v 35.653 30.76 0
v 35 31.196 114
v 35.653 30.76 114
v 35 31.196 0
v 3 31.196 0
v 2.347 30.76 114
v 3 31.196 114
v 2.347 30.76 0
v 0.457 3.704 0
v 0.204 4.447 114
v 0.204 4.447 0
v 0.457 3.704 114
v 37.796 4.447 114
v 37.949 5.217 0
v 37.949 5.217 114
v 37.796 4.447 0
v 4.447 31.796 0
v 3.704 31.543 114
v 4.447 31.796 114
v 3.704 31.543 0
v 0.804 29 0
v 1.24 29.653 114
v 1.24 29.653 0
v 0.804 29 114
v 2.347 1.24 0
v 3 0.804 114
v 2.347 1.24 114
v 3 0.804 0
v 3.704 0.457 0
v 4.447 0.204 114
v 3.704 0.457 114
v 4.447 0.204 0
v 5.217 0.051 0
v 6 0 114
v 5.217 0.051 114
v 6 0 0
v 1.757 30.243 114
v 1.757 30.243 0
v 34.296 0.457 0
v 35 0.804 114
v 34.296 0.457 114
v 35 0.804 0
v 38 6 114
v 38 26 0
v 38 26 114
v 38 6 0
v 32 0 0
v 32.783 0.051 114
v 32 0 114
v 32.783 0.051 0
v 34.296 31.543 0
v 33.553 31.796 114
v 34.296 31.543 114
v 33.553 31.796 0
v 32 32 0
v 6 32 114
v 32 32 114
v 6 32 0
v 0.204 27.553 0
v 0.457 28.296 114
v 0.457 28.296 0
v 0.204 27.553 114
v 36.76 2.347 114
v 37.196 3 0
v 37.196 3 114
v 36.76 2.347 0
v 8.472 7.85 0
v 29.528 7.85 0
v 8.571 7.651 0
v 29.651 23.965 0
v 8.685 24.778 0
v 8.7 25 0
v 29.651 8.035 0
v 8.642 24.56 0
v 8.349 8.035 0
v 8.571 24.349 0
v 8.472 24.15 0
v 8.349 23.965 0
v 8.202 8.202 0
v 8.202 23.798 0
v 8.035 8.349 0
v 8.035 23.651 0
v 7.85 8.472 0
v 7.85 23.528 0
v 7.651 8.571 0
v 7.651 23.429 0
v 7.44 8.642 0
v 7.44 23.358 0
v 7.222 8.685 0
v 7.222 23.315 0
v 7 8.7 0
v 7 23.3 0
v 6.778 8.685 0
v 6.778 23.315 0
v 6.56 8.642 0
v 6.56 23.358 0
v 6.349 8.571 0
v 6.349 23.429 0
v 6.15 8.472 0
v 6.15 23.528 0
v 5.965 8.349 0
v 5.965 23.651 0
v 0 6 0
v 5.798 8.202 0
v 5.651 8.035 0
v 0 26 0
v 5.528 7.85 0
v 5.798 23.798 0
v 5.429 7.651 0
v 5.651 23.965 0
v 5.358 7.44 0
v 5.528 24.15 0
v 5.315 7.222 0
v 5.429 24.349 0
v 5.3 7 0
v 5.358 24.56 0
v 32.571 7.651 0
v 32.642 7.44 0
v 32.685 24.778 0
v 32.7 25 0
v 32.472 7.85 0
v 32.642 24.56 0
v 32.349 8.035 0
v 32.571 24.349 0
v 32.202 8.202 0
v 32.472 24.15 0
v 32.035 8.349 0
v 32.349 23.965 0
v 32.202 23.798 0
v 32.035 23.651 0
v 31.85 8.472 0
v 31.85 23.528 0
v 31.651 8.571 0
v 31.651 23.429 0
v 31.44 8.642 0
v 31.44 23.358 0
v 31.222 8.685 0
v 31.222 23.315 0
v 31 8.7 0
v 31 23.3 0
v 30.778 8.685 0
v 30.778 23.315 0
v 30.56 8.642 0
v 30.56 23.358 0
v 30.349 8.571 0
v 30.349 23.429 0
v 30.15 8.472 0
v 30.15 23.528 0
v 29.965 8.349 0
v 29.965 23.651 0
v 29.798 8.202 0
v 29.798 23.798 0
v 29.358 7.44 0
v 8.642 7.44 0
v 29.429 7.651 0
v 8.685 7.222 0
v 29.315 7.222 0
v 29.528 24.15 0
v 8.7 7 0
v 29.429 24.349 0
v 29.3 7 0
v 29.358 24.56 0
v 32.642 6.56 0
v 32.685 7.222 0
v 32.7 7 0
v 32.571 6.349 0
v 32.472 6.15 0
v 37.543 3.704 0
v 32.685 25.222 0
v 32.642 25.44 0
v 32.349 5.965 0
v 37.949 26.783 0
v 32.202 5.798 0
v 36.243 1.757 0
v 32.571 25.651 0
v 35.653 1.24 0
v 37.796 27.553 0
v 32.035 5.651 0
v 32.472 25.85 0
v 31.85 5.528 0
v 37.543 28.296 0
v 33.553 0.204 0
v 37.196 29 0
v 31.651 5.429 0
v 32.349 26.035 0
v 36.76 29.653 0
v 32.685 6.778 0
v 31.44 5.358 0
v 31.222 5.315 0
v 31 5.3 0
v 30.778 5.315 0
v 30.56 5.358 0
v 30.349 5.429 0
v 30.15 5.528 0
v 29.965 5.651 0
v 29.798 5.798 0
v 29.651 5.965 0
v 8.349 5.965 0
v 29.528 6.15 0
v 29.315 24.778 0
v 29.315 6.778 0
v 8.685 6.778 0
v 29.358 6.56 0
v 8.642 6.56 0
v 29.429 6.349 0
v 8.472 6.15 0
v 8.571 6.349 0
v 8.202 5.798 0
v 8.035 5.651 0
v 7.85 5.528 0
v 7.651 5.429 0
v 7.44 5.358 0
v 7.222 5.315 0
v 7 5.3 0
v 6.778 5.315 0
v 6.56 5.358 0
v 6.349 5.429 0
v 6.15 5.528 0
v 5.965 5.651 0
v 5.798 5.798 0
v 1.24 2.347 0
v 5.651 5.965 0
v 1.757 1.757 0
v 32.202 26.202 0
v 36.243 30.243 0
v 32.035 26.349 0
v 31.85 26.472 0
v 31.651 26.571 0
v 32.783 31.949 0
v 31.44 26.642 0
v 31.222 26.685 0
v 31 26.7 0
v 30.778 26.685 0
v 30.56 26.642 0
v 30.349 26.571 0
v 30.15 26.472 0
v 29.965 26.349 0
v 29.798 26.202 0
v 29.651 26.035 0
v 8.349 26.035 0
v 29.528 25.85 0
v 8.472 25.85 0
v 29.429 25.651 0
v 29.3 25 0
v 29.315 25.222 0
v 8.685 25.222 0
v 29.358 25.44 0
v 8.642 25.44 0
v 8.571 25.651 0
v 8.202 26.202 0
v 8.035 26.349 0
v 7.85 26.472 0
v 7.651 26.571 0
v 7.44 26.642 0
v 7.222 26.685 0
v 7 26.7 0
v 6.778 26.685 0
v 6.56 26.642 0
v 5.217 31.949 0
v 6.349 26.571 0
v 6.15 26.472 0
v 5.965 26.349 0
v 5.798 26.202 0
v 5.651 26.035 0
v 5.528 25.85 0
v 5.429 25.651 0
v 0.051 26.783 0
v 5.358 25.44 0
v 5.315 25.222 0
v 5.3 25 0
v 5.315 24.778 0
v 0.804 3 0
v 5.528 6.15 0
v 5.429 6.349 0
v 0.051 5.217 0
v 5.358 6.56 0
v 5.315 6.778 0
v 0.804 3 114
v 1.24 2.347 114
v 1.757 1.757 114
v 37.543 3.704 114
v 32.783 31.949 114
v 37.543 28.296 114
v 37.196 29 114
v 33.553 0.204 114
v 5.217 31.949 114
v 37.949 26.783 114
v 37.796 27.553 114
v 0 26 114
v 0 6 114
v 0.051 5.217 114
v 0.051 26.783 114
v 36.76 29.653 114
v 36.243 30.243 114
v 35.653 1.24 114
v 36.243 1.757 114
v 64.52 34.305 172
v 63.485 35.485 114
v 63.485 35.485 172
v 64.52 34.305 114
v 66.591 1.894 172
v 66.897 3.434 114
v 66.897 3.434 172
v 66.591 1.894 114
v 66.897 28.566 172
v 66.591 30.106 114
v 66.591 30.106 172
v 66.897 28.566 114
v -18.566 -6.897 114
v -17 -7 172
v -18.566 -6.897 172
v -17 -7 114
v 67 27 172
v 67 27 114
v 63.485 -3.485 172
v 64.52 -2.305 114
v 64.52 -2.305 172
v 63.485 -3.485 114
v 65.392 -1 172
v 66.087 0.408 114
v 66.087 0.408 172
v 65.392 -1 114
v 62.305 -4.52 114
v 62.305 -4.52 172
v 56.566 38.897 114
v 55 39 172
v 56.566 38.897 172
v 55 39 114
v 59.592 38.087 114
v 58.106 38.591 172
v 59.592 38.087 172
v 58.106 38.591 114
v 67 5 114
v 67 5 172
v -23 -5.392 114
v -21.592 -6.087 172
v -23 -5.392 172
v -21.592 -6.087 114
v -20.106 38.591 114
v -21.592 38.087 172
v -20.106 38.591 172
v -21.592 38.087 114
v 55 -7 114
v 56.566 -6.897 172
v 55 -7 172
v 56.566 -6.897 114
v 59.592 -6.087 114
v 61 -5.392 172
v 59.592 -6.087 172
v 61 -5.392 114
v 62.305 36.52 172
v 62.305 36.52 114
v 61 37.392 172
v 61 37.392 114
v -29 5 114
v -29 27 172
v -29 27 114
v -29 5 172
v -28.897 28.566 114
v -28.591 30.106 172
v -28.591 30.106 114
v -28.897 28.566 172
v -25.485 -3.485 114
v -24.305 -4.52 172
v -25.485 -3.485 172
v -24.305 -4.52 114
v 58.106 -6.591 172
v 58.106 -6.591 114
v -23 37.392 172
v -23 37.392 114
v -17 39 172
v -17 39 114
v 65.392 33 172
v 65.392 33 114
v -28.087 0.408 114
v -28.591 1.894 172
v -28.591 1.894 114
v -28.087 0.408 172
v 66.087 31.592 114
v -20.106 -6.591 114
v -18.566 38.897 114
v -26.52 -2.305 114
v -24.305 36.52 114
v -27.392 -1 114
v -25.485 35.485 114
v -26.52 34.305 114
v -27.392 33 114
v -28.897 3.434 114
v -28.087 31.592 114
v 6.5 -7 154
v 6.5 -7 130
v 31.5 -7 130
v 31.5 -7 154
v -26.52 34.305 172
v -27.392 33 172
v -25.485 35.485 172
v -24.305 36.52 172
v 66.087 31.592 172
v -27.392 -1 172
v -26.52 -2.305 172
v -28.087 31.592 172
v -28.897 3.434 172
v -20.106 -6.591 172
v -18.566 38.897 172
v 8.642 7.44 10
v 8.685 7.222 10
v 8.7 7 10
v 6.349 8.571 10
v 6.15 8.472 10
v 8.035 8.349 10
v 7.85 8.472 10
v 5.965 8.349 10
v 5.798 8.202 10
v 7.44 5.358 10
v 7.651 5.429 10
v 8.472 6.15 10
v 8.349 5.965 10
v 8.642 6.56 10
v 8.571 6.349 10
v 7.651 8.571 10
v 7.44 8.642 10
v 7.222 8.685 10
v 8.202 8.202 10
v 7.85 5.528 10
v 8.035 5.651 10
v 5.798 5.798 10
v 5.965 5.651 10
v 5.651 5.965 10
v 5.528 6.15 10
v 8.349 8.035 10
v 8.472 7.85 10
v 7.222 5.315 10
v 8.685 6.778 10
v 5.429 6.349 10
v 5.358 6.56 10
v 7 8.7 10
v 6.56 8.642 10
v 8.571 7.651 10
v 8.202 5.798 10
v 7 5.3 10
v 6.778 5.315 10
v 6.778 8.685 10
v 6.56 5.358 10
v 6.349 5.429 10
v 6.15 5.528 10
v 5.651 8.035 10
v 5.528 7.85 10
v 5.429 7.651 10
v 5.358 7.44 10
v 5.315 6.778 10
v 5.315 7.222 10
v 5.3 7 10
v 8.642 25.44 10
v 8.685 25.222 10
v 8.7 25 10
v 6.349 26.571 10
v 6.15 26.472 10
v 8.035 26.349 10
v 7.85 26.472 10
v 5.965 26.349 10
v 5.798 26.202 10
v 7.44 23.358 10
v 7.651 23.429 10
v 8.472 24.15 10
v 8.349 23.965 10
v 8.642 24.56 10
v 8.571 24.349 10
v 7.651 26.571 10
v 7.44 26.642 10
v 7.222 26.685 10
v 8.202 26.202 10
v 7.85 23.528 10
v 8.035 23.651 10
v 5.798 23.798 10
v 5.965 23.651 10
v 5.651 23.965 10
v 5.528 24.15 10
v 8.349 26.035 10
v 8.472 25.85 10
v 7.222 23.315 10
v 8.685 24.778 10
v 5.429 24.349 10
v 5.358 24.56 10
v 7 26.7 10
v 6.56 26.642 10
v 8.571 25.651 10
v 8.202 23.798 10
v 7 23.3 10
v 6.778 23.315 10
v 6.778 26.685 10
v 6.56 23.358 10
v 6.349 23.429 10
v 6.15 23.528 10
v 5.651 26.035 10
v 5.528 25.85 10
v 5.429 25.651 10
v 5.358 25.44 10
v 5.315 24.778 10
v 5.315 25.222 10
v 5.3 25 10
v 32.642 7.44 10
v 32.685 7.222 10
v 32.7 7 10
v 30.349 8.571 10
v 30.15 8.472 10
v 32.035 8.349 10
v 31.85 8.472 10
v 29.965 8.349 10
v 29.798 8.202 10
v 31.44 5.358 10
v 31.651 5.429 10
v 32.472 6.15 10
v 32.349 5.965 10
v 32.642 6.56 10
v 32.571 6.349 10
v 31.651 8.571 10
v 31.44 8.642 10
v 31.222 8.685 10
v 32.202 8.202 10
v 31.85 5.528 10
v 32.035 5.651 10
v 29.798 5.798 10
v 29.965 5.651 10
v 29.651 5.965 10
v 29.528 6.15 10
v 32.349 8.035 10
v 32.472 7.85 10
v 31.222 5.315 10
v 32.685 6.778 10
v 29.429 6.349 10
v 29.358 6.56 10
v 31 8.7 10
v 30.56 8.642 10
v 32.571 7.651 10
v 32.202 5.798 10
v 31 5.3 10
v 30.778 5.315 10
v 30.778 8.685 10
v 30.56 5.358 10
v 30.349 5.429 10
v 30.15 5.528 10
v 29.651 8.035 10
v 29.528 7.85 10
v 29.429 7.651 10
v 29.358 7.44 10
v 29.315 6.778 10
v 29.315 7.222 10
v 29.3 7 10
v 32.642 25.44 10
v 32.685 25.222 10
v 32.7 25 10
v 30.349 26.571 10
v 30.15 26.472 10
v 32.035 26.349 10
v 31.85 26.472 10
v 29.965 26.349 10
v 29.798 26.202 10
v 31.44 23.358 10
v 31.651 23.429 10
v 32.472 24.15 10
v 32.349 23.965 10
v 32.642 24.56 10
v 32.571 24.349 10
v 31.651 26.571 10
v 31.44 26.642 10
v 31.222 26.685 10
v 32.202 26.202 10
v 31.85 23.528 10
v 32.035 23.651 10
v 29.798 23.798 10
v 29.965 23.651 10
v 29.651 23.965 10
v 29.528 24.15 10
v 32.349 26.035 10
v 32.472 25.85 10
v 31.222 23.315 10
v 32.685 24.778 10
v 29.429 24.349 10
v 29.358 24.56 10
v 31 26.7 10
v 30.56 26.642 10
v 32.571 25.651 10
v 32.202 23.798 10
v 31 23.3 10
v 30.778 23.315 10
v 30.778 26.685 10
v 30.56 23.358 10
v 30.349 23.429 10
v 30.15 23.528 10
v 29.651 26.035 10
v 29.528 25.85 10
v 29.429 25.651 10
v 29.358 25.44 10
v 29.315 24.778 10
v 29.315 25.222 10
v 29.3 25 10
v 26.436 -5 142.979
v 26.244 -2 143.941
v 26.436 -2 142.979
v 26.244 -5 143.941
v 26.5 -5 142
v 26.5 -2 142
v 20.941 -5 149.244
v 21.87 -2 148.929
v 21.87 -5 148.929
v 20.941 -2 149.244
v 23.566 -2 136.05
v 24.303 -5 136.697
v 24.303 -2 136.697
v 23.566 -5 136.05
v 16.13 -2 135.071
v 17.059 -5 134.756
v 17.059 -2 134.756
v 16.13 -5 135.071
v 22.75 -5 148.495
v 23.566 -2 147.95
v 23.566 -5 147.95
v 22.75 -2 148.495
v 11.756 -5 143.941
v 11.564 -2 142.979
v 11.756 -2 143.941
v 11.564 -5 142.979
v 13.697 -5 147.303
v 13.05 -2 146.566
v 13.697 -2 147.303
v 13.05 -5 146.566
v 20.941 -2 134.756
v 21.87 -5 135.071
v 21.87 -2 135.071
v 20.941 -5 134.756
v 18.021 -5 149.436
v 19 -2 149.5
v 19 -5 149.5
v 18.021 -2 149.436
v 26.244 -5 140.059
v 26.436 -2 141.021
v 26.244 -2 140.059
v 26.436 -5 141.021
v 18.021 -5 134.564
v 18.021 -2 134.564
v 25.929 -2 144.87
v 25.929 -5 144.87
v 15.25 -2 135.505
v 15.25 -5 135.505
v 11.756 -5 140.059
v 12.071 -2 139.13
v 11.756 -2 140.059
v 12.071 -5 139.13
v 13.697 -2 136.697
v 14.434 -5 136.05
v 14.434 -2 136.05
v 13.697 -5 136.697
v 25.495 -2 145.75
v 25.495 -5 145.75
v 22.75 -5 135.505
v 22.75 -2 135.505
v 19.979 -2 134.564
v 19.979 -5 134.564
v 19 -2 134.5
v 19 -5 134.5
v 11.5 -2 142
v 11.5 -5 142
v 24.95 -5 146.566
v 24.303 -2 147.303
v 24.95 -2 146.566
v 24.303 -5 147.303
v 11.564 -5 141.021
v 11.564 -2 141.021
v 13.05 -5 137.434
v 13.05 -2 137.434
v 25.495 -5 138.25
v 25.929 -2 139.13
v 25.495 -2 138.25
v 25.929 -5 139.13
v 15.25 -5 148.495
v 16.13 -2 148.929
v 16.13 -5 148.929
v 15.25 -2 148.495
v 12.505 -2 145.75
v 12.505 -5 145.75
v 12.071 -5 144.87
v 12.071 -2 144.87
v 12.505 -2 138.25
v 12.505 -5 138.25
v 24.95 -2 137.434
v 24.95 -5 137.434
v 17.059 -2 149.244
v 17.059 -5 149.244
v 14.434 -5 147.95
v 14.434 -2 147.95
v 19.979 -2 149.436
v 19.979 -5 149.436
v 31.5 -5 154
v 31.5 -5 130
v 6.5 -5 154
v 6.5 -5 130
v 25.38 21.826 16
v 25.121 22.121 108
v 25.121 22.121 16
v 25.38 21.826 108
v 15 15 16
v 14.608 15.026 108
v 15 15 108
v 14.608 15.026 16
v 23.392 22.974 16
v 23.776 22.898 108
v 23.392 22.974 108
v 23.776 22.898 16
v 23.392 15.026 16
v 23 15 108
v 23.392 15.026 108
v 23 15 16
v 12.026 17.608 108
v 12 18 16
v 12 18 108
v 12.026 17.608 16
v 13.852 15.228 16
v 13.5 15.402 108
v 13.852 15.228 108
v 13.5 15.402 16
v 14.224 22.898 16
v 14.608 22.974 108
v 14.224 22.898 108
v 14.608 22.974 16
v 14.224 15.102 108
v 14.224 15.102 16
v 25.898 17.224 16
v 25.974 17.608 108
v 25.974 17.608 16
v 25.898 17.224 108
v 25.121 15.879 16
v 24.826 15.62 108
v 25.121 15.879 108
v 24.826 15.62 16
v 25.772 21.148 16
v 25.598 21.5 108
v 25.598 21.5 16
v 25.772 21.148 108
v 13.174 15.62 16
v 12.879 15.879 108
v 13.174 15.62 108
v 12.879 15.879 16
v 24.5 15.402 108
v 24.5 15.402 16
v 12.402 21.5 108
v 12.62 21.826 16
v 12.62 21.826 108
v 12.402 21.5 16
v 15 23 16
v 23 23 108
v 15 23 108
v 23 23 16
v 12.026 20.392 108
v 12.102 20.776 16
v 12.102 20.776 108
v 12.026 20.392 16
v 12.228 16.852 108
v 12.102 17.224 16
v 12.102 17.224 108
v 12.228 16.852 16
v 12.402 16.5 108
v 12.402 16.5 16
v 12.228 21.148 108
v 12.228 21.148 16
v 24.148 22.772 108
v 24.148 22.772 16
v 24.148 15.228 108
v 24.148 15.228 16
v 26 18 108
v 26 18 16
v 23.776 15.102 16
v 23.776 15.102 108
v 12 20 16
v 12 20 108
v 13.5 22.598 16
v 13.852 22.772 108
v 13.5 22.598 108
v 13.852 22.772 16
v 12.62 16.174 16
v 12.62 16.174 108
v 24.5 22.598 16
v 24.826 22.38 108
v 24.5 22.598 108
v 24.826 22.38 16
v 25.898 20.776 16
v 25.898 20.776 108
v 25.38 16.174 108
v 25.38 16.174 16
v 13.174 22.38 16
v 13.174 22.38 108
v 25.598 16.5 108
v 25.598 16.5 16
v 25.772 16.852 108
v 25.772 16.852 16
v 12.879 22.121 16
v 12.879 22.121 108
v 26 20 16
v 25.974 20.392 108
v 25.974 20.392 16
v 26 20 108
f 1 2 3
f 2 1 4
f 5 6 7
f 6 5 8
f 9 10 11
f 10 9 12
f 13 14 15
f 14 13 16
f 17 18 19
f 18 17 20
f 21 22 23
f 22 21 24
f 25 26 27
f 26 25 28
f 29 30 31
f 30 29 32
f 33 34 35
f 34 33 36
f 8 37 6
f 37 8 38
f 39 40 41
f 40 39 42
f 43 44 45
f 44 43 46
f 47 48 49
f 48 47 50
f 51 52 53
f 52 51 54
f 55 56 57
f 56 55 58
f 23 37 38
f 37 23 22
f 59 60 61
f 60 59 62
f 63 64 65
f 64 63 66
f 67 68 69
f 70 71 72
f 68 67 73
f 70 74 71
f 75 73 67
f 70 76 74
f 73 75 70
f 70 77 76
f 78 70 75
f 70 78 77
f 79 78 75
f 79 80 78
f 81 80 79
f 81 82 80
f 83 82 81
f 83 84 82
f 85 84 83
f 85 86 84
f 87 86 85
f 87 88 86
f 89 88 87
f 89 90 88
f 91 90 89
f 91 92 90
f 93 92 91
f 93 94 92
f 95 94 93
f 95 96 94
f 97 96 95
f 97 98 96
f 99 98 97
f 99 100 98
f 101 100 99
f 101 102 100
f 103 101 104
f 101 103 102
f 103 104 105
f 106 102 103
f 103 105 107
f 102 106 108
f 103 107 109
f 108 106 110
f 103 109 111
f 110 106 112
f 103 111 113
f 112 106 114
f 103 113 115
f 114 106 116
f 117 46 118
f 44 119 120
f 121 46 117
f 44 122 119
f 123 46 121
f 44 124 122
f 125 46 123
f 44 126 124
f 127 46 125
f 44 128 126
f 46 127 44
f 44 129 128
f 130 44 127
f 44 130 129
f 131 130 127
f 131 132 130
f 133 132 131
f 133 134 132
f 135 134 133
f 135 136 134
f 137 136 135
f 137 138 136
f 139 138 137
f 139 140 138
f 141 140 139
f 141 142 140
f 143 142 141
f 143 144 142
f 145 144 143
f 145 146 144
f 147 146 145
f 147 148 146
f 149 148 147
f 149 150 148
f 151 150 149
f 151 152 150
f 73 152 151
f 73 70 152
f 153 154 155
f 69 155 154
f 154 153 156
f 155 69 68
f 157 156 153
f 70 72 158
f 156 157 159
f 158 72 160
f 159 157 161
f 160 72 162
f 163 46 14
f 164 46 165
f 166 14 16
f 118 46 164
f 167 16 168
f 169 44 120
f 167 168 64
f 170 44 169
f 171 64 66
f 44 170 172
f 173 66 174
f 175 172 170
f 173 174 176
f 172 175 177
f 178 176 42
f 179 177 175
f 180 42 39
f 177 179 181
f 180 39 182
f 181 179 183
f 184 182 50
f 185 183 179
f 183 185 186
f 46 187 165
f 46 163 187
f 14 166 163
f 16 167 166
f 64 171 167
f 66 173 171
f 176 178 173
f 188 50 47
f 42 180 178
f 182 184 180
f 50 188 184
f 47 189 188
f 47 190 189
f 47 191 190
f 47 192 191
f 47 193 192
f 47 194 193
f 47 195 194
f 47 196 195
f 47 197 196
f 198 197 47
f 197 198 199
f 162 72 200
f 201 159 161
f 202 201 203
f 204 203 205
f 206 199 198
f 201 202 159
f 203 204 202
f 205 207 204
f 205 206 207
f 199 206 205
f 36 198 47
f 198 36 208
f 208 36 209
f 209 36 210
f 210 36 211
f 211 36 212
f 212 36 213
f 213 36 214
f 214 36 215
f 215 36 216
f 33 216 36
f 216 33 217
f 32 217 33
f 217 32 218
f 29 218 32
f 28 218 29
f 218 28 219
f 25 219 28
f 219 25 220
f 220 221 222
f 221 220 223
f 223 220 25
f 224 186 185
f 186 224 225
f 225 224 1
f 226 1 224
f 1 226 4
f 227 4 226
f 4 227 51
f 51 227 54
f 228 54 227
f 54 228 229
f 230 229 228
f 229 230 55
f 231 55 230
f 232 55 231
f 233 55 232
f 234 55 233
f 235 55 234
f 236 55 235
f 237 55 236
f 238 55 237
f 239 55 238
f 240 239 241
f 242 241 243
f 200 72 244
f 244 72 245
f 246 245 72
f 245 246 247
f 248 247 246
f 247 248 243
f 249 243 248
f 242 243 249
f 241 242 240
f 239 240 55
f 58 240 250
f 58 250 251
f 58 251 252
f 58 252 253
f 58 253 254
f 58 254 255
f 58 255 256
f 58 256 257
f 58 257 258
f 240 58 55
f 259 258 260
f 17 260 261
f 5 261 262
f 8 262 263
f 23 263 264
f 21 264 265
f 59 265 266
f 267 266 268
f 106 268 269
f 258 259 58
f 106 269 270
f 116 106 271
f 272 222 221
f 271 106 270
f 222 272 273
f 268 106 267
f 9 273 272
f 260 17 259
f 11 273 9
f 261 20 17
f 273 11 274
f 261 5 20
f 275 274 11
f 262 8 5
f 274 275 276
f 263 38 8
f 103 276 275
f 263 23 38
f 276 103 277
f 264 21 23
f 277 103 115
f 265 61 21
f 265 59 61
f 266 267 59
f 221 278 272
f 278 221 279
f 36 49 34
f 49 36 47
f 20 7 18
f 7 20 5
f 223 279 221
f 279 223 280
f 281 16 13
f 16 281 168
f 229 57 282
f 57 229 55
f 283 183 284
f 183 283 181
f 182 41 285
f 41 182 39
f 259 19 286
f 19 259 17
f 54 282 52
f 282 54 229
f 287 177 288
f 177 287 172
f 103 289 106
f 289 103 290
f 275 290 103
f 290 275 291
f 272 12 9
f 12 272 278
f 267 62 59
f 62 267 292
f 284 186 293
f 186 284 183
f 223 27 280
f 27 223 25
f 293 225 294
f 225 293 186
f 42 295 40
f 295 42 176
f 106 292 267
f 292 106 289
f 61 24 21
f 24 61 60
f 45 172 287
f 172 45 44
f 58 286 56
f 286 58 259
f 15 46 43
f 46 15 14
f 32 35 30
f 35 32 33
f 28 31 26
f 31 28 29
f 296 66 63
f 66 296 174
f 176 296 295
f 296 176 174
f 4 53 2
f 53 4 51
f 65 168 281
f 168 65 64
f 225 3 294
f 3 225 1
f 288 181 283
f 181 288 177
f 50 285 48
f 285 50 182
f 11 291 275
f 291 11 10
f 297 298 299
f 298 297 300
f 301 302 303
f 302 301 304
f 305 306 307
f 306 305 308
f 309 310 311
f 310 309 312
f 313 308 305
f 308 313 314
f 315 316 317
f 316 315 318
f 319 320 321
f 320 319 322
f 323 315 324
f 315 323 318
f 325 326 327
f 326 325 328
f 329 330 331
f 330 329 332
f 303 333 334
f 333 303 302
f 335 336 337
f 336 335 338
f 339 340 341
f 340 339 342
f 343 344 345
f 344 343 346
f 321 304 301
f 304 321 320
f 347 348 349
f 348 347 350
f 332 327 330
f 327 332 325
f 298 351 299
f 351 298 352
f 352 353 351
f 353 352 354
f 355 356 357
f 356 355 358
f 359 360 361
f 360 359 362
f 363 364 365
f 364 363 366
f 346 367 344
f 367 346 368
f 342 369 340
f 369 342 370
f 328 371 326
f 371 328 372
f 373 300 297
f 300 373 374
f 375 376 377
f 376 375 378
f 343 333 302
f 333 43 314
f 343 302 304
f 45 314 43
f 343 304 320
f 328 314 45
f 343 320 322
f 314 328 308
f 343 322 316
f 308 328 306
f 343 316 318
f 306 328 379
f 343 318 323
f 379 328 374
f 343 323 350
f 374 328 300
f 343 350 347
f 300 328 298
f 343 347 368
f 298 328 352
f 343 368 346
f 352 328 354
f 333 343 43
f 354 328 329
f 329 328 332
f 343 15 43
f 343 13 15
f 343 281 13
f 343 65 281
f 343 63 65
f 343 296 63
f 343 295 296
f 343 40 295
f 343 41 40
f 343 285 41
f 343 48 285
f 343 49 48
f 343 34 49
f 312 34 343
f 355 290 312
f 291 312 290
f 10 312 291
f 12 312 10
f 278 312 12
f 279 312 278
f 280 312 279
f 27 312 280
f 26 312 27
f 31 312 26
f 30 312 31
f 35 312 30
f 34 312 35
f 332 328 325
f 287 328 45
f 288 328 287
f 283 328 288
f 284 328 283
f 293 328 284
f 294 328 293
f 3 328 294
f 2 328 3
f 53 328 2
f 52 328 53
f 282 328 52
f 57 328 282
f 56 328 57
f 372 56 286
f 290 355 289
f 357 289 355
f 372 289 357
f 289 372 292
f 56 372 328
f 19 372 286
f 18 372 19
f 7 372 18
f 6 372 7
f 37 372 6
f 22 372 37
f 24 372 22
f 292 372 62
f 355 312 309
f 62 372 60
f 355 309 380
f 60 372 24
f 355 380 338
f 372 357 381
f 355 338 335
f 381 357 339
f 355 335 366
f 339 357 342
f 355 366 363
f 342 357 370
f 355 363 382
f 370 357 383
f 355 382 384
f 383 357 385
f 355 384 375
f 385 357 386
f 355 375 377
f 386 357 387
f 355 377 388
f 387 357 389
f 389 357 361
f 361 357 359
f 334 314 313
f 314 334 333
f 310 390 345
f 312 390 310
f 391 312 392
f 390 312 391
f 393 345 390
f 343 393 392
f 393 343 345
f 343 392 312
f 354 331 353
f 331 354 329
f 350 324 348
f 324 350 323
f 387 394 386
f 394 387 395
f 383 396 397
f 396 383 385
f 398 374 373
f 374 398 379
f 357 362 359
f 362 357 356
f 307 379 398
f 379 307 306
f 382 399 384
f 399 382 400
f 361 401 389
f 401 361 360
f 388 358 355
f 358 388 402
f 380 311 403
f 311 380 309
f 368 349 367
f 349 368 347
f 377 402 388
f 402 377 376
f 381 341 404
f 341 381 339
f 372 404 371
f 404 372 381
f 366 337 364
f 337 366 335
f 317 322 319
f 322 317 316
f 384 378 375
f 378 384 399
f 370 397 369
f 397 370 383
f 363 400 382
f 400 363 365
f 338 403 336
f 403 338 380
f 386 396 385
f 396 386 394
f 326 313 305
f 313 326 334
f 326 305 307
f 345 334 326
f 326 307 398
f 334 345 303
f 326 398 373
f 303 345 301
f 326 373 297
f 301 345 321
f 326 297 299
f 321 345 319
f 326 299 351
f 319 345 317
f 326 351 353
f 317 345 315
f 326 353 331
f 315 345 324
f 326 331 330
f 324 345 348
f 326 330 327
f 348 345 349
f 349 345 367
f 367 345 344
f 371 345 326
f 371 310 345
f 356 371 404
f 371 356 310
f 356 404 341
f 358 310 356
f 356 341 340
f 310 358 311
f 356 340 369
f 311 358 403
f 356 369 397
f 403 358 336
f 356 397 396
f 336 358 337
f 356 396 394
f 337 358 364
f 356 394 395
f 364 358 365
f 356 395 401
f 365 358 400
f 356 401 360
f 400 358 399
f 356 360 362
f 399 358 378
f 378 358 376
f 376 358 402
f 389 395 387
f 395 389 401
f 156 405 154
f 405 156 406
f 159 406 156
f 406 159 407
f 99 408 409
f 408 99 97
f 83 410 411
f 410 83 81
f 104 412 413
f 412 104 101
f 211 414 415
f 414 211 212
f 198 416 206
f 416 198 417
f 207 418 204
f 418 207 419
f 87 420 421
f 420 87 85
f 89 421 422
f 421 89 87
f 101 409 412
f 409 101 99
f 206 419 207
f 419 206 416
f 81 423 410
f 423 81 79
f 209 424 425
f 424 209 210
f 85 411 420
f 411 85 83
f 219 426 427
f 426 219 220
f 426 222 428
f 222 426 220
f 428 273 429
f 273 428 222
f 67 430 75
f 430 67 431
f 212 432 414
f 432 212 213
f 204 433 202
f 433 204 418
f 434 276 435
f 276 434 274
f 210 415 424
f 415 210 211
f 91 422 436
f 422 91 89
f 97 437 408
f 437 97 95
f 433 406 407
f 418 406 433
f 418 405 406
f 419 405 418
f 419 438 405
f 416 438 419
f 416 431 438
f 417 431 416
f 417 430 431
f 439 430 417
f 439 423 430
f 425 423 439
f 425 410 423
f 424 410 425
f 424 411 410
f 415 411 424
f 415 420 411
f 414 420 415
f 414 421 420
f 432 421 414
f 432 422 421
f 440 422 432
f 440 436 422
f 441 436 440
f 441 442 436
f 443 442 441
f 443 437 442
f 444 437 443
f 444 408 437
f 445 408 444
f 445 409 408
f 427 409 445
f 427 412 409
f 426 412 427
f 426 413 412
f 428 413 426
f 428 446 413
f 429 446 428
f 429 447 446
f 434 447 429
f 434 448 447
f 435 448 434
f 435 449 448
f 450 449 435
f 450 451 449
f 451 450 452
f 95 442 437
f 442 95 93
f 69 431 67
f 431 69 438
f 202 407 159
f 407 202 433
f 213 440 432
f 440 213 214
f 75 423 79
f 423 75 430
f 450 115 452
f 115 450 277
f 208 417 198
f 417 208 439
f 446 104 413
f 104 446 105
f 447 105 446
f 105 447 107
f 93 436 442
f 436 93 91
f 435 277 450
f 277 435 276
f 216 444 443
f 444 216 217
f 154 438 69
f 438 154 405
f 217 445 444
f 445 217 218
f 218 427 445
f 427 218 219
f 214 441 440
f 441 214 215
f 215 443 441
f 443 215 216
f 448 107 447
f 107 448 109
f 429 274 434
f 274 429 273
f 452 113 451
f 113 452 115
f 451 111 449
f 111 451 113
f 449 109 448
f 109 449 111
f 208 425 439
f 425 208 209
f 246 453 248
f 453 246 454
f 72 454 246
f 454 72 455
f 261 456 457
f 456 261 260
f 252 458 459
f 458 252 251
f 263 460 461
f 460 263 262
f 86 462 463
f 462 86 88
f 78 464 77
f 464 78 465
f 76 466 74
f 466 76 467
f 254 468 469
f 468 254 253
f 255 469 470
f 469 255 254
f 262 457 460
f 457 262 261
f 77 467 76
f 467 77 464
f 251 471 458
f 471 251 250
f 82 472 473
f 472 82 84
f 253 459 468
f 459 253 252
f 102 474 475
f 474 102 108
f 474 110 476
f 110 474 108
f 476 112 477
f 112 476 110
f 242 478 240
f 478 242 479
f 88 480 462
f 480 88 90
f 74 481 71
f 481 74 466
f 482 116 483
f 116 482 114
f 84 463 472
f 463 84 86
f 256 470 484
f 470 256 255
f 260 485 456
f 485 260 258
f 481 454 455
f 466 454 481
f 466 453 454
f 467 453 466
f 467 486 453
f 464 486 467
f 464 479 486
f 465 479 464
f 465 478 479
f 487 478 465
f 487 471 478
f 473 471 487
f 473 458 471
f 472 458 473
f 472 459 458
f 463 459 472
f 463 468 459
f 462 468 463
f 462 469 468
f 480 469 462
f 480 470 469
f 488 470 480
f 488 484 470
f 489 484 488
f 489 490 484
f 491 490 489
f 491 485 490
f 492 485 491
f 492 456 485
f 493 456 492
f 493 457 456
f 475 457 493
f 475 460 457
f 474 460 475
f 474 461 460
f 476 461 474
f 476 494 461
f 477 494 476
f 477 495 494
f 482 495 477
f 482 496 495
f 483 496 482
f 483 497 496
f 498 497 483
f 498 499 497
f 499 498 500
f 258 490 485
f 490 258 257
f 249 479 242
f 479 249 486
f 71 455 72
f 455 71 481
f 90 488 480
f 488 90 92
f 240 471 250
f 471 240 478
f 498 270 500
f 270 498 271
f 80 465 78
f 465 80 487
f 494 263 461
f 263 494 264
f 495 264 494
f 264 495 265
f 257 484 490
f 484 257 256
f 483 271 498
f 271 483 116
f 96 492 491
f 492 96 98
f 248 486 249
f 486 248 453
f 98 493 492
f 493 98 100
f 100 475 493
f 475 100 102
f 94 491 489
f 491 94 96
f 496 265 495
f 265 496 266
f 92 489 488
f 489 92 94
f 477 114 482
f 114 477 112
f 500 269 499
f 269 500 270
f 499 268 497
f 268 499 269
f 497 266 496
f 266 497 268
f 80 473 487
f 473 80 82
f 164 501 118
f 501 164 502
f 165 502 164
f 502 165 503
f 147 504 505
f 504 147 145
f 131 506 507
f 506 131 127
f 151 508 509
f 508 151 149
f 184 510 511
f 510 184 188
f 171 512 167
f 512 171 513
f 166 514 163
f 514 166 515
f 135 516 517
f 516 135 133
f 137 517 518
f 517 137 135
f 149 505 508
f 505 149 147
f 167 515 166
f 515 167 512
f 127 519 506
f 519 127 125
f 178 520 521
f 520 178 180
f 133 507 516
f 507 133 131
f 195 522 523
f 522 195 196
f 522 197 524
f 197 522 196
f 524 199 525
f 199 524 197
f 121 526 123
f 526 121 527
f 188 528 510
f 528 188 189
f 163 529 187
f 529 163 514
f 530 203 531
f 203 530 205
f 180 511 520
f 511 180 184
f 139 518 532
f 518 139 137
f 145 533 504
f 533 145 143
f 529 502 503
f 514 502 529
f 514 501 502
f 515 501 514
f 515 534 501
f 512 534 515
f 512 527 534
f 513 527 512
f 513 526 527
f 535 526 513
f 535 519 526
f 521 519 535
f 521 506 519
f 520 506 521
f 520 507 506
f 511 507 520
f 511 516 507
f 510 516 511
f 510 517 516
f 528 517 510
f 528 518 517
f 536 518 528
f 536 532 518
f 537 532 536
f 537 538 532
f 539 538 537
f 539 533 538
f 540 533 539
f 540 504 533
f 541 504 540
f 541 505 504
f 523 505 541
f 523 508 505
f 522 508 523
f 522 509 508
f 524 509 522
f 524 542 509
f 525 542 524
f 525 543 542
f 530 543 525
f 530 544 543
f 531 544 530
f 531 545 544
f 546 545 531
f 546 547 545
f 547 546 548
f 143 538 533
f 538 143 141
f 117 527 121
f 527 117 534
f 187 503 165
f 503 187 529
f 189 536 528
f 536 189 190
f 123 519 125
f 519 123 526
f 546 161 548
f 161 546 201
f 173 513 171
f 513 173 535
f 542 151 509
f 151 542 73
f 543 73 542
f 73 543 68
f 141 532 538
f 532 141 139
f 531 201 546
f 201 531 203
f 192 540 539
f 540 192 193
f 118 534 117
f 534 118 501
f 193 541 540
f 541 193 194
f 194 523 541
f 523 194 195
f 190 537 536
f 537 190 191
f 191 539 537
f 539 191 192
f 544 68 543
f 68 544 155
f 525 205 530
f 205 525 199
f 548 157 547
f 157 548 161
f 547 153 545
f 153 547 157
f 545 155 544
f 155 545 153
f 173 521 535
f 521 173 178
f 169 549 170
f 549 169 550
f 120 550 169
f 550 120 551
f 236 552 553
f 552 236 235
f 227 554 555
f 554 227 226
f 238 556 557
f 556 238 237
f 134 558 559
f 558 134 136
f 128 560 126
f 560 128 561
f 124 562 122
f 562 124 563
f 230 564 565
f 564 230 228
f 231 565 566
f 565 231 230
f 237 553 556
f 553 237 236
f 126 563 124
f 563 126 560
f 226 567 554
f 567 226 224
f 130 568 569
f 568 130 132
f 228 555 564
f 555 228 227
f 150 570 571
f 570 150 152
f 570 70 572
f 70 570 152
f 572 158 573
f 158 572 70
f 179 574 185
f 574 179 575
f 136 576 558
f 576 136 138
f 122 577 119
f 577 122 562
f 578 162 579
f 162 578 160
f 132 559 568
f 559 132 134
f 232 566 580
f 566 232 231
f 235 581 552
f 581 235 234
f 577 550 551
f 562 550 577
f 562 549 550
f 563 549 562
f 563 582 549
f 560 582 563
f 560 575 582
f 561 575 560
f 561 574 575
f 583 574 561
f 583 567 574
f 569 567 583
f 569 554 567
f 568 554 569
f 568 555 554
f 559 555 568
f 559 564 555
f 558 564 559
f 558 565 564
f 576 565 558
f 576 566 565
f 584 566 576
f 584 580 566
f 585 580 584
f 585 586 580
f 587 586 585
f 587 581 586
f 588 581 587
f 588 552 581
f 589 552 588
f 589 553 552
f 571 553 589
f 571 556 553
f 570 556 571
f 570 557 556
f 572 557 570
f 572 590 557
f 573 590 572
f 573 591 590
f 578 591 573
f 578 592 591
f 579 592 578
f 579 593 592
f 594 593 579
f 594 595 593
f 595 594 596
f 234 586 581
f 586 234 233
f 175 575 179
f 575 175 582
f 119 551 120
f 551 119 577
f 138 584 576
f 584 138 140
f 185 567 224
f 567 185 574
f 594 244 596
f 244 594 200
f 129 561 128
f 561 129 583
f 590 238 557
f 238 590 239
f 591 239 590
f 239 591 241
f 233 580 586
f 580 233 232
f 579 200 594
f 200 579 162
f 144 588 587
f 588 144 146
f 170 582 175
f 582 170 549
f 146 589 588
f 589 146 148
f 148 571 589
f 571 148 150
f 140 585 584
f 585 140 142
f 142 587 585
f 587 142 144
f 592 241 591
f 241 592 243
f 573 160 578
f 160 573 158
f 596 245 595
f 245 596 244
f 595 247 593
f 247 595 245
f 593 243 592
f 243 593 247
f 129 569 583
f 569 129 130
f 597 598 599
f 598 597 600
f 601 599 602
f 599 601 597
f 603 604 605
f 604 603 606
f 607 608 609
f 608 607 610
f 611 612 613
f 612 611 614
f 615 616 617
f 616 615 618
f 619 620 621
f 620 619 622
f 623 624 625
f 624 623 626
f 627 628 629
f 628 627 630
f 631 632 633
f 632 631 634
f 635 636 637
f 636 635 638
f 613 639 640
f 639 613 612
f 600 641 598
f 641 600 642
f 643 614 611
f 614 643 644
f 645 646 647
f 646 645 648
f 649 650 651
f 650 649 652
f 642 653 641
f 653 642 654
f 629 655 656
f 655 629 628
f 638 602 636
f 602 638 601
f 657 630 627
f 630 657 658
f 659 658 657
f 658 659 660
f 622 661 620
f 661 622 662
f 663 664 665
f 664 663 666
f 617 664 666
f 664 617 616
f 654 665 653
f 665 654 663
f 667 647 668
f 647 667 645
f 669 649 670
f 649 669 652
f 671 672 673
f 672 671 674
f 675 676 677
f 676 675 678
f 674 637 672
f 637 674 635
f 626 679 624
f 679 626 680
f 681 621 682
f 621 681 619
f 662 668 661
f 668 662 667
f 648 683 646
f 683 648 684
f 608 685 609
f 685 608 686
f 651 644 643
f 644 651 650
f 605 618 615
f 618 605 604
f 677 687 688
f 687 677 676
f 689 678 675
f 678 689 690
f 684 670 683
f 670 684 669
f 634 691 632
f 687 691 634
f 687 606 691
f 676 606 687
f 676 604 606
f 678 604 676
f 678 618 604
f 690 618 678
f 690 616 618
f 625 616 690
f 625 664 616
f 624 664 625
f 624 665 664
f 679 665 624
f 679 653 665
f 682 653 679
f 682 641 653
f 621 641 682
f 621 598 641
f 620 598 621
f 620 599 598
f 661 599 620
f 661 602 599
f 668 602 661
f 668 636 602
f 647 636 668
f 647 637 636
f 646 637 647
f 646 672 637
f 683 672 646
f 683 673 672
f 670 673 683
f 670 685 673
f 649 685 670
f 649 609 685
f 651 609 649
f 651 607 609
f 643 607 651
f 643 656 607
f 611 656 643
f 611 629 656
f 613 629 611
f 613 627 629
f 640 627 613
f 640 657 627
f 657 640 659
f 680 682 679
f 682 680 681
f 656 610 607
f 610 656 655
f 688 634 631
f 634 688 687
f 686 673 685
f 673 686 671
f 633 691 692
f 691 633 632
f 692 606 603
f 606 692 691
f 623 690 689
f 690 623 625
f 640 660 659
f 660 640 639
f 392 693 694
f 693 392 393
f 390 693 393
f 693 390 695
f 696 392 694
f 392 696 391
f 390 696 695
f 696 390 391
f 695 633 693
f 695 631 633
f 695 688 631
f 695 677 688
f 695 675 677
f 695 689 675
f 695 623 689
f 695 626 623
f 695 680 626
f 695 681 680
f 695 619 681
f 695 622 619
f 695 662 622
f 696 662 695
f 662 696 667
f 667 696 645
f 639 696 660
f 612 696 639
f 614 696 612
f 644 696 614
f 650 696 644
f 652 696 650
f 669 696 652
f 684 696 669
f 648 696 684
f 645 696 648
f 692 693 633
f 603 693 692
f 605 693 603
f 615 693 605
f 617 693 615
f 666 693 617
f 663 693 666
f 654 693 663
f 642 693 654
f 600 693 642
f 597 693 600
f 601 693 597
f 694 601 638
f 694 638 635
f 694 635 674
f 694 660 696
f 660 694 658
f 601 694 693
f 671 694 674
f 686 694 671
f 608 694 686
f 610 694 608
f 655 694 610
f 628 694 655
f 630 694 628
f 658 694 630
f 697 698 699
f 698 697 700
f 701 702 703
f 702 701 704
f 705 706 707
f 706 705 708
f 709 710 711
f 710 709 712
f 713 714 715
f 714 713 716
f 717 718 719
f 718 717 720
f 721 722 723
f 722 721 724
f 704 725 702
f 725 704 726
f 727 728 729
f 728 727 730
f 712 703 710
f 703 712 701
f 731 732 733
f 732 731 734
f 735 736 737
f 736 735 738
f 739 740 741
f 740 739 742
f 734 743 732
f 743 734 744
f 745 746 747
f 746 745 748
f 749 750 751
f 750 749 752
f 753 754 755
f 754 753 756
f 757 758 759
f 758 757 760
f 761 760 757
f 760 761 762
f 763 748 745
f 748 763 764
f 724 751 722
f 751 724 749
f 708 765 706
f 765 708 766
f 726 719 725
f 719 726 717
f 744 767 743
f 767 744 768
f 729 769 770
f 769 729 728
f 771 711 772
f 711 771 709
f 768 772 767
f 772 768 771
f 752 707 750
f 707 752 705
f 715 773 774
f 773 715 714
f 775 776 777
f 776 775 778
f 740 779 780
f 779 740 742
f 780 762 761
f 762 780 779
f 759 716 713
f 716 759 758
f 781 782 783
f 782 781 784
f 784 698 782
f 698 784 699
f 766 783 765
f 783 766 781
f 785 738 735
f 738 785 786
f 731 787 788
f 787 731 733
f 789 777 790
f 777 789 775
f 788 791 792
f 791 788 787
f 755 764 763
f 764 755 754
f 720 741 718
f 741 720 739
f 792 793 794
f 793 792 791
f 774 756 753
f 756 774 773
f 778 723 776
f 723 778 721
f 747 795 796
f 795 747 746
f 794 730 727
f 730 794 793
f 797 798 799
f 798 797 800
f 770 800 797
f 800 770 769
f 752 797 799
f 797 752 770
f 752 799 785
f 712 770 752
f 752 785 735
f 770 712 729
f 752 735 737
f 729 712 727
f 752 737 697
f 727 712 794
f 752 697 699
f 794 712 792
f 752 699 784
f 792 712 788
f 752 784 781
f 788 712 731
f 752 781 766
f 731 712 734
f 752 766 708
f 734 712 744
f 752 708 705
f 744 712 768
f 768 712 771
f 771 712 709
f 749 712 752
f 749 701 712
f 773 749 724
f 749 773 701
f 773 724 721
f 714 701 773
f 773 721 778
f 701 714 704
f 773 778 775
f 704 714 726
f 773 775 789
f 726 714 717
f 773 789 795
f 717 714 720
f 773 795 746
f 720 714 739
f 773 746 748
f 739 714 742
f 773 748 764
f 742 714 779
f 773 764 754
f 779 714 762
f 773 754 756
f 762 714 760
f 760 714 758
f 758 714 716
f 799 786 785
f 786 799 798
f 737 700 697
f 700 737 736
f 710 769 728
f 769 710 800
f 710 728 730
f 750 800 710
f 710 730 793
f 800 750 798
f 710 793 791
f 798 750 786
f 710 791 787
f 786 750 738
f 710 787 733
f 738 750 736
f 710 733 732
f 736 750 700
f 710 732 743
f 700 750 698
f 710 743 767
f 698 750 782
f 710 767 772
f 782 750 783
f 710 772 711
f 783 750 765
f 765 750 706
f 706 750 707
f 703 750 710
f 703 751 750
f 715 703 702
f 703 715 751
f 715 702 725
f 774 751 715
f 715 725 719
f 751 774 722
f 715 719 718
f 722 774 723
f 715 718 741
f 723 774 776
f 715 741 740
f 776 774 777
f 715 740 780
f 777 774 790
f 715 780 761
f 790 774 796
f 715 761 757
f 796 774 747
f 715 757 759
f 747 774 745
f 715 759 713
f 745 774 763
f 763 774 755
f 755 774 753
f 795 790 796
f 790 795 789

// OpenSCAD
// file: robot_params.scad
// Shared mechanical parameters for Codex house companion CAD v0.
// Units: millimeters.
$fn = 48;

// Body envelope
base_len = 300;
base_w = 220;
base_floor_th = 4;
wall_th = 3;
corner_r = 12;
base_wall_h = 34;
deck_z = 48;
total_body_h = 112;

// Personality / render colors
codex_teal = "#13C8C3";
codex_blue = "#2F6BFF";
codex_cream = "#F5F0E6";
codex_charcoal = "#242832";
codex_lime = "#B9FF66";
codex_orange = "#FF9F1C";
bumper_tpu = "#2B2F3A";

// Drive
wheel_d = 80;
wheel_w = 24;
axle_z = 42;
axle_x = 145;
wheel_clearance = 5;
motor_mount_slot = 5;
motor_pod_len = 72;
motor_pod_w = 36;
motor_pod_h = 46;

// Fasteners
m3_clearance_d = 3.4;
m3_insert_d = 4.8;
m3_insert_depth = 5.7;
m25_clearance_d = 2.8;
m2_clearance_d = 2.3;

// Electronics
pi_len = 85;
pi_w = 56;
pi_mount_x = 58;
pi_mount_y = 49;
hat_keepout_z = 28;
cooling_keepout_z = 18;
deck_th = 4;
deck_offset_x = 18;
deck_offset_y = 14;
deck_mount_x = [24, base_len-60];
deck_mount_y = [20, base_w-62];
deck_boss_x = [deck_offset_x + deck_mount_x[0], deck_offset_x + deck_mount_x[1]];
deck_boss_y = [deck_offset_y + deck_mount_y[0], deck_offset_y + deck_mount_y[1]];
deck_len = base_len - 36;
deck_w = base_w - 42;

// Battery
battery_len = 110;
battery_w = 38;
battery_h = 38;
battery_padding = 3;
strap_slot_w = 8;
strap_slot_len = 46;
battery_cradle_mount_x = [12, battery_len + 2*battery_padding + 2];
battery_cradle_mount_y = [10, battery_w + 2*battery_padding + 2];

// Storage keepout for later USB 3 module
usb_storage_len = 90;
usb_storage_w = 35;
usb_storage_h = 12;
usb_cable_bend_r = 25;

// Sensors and expression
head_z = 205;
mast_h = 120;
mast_w = 38;
mast_d = 32;
head_w = 96;
head_h = 58;
head_d = 46;
camera_board_w = 25;
camera_board_h = 24;
tof_pod_w = 24;
tof_pod_h = 18;
tof_pod_d = 18;
front_sensor_angle = 20;
bumper_travel = 8;
soft_bumper_h = 22;

// Assembly anchors / safety placeholders
battery_cradle_x = 166;
battery_cradle_y = base_w/2 - (battery_w + 2*battery_padding + 12)/2;
motor_pod_anchor_x = [axle_x-28, axle_x+28];
motor_pod_anchor_y = [base_w/2 - 61, base_w/2 + 61];
motor_pod_local_hole_x = [8, 64];
motor_pod_local_hole_y = motor_pod_w/2;
estop_x = base_len - 62;
estop_y = base_w/2;
estop_mount_d = 22;
estop_guard_d = 48;
estop_plate_w = 70;
estop_plate_d = 62;
estop_plate_th = 5;
estop_plate_mount_x = [10, estop_plate_w - 10];
estop_plate_mount_y = [10, estop_plate_d - 10];

// Split-print helpers for common 220 x 220 mm beds
base_split_x = base_len/2;
deck_split_x = deck_len/2;
seam_screw_offset = 14;
base_seam_y = [42, base_w/2, base_w-42];
deck_seam_y = [36, deck_w/2, deck_w-36];
seam_plate_w = 64;
seam_plate_d = 18;
seam_plate_th = 3;

module rounded_box(size=[10,10,10], r=2, center=false) {
  // Lightweight printable rounded rectangle prism using hull of cylinders.
  translate(center ? [-size[0]/2, -size[1]/2, -size[2]/2] : [0,0,0])
  hull() {
    for (x=[r, size[0]-r]) for (y=[r, size[1]-r])
      translate([x,y,0]) cylinder(h=size[2], r=r);
  }
}

module screw_hole(d=m3_clearance_d, h=20) {
  cylinder(h=h, d=d, center=true);
}

module preview_only() {
  if ($preview) children();
}

module insert_boss(d=10, h=8, hole=m3_insert_d) {
  difference() { cylinder(h=h, d=d); translate([0,0,-1]) cylinder(h=h+2, d=hole); }
}
// main file
include <robot_params.scad>
module camera_head_bracket() {
  color(codex_teal) difference(){
    union(){
      rounded_box([mast_w,mast_d,mast_h],6);
      translate([-(head_w-mast_w)/2,-7,mast_h-6]) rounded_box([head_w,head_d,head_h],12);
    }
    translate([mast_w/2,-12,mast_h+22]) rotate([90,0,0]) cylinder(h=20,d=15,center=true); // camera lens
    translate([(mast_w-camera_board_w)/2,-9,mast_h+10]) cube([camera_board_w,4,camera_board_h]);
    translate([mast_w/2-7,mast_d/2-1,16]) rounded_box([14,8,mast_h-28],3); // ribbon path
    for (x=[7,mast_w-7]) for (y=[7,mast_d-7]) translate([x,y,0]) screw_hole(h=20);
  }
  preview_only() {
    // brow / ears and eyes for friendly Codex look; final faceplate is separate.
    translate([-head_w/2+8,-10,mast_h+head_h-8]) rotate([0,18,0]) color(codex_blue) rounded_box([34,12,10],5);
    translate([head_w/2-42,-10,mast_h+head_h-8]) rotate([0,-18,0]) color(codex_blue) rounded_box([34,12,10],5);
    color(codex_lime) translate([mast_w/2-28,-14,mast_h+34]) sphere(d=10);
    color(codex_lime) translate([mast_w/2+28,-14,mast_h+34]) sphere(d=10);
  }
}
camera_head_bracket();
